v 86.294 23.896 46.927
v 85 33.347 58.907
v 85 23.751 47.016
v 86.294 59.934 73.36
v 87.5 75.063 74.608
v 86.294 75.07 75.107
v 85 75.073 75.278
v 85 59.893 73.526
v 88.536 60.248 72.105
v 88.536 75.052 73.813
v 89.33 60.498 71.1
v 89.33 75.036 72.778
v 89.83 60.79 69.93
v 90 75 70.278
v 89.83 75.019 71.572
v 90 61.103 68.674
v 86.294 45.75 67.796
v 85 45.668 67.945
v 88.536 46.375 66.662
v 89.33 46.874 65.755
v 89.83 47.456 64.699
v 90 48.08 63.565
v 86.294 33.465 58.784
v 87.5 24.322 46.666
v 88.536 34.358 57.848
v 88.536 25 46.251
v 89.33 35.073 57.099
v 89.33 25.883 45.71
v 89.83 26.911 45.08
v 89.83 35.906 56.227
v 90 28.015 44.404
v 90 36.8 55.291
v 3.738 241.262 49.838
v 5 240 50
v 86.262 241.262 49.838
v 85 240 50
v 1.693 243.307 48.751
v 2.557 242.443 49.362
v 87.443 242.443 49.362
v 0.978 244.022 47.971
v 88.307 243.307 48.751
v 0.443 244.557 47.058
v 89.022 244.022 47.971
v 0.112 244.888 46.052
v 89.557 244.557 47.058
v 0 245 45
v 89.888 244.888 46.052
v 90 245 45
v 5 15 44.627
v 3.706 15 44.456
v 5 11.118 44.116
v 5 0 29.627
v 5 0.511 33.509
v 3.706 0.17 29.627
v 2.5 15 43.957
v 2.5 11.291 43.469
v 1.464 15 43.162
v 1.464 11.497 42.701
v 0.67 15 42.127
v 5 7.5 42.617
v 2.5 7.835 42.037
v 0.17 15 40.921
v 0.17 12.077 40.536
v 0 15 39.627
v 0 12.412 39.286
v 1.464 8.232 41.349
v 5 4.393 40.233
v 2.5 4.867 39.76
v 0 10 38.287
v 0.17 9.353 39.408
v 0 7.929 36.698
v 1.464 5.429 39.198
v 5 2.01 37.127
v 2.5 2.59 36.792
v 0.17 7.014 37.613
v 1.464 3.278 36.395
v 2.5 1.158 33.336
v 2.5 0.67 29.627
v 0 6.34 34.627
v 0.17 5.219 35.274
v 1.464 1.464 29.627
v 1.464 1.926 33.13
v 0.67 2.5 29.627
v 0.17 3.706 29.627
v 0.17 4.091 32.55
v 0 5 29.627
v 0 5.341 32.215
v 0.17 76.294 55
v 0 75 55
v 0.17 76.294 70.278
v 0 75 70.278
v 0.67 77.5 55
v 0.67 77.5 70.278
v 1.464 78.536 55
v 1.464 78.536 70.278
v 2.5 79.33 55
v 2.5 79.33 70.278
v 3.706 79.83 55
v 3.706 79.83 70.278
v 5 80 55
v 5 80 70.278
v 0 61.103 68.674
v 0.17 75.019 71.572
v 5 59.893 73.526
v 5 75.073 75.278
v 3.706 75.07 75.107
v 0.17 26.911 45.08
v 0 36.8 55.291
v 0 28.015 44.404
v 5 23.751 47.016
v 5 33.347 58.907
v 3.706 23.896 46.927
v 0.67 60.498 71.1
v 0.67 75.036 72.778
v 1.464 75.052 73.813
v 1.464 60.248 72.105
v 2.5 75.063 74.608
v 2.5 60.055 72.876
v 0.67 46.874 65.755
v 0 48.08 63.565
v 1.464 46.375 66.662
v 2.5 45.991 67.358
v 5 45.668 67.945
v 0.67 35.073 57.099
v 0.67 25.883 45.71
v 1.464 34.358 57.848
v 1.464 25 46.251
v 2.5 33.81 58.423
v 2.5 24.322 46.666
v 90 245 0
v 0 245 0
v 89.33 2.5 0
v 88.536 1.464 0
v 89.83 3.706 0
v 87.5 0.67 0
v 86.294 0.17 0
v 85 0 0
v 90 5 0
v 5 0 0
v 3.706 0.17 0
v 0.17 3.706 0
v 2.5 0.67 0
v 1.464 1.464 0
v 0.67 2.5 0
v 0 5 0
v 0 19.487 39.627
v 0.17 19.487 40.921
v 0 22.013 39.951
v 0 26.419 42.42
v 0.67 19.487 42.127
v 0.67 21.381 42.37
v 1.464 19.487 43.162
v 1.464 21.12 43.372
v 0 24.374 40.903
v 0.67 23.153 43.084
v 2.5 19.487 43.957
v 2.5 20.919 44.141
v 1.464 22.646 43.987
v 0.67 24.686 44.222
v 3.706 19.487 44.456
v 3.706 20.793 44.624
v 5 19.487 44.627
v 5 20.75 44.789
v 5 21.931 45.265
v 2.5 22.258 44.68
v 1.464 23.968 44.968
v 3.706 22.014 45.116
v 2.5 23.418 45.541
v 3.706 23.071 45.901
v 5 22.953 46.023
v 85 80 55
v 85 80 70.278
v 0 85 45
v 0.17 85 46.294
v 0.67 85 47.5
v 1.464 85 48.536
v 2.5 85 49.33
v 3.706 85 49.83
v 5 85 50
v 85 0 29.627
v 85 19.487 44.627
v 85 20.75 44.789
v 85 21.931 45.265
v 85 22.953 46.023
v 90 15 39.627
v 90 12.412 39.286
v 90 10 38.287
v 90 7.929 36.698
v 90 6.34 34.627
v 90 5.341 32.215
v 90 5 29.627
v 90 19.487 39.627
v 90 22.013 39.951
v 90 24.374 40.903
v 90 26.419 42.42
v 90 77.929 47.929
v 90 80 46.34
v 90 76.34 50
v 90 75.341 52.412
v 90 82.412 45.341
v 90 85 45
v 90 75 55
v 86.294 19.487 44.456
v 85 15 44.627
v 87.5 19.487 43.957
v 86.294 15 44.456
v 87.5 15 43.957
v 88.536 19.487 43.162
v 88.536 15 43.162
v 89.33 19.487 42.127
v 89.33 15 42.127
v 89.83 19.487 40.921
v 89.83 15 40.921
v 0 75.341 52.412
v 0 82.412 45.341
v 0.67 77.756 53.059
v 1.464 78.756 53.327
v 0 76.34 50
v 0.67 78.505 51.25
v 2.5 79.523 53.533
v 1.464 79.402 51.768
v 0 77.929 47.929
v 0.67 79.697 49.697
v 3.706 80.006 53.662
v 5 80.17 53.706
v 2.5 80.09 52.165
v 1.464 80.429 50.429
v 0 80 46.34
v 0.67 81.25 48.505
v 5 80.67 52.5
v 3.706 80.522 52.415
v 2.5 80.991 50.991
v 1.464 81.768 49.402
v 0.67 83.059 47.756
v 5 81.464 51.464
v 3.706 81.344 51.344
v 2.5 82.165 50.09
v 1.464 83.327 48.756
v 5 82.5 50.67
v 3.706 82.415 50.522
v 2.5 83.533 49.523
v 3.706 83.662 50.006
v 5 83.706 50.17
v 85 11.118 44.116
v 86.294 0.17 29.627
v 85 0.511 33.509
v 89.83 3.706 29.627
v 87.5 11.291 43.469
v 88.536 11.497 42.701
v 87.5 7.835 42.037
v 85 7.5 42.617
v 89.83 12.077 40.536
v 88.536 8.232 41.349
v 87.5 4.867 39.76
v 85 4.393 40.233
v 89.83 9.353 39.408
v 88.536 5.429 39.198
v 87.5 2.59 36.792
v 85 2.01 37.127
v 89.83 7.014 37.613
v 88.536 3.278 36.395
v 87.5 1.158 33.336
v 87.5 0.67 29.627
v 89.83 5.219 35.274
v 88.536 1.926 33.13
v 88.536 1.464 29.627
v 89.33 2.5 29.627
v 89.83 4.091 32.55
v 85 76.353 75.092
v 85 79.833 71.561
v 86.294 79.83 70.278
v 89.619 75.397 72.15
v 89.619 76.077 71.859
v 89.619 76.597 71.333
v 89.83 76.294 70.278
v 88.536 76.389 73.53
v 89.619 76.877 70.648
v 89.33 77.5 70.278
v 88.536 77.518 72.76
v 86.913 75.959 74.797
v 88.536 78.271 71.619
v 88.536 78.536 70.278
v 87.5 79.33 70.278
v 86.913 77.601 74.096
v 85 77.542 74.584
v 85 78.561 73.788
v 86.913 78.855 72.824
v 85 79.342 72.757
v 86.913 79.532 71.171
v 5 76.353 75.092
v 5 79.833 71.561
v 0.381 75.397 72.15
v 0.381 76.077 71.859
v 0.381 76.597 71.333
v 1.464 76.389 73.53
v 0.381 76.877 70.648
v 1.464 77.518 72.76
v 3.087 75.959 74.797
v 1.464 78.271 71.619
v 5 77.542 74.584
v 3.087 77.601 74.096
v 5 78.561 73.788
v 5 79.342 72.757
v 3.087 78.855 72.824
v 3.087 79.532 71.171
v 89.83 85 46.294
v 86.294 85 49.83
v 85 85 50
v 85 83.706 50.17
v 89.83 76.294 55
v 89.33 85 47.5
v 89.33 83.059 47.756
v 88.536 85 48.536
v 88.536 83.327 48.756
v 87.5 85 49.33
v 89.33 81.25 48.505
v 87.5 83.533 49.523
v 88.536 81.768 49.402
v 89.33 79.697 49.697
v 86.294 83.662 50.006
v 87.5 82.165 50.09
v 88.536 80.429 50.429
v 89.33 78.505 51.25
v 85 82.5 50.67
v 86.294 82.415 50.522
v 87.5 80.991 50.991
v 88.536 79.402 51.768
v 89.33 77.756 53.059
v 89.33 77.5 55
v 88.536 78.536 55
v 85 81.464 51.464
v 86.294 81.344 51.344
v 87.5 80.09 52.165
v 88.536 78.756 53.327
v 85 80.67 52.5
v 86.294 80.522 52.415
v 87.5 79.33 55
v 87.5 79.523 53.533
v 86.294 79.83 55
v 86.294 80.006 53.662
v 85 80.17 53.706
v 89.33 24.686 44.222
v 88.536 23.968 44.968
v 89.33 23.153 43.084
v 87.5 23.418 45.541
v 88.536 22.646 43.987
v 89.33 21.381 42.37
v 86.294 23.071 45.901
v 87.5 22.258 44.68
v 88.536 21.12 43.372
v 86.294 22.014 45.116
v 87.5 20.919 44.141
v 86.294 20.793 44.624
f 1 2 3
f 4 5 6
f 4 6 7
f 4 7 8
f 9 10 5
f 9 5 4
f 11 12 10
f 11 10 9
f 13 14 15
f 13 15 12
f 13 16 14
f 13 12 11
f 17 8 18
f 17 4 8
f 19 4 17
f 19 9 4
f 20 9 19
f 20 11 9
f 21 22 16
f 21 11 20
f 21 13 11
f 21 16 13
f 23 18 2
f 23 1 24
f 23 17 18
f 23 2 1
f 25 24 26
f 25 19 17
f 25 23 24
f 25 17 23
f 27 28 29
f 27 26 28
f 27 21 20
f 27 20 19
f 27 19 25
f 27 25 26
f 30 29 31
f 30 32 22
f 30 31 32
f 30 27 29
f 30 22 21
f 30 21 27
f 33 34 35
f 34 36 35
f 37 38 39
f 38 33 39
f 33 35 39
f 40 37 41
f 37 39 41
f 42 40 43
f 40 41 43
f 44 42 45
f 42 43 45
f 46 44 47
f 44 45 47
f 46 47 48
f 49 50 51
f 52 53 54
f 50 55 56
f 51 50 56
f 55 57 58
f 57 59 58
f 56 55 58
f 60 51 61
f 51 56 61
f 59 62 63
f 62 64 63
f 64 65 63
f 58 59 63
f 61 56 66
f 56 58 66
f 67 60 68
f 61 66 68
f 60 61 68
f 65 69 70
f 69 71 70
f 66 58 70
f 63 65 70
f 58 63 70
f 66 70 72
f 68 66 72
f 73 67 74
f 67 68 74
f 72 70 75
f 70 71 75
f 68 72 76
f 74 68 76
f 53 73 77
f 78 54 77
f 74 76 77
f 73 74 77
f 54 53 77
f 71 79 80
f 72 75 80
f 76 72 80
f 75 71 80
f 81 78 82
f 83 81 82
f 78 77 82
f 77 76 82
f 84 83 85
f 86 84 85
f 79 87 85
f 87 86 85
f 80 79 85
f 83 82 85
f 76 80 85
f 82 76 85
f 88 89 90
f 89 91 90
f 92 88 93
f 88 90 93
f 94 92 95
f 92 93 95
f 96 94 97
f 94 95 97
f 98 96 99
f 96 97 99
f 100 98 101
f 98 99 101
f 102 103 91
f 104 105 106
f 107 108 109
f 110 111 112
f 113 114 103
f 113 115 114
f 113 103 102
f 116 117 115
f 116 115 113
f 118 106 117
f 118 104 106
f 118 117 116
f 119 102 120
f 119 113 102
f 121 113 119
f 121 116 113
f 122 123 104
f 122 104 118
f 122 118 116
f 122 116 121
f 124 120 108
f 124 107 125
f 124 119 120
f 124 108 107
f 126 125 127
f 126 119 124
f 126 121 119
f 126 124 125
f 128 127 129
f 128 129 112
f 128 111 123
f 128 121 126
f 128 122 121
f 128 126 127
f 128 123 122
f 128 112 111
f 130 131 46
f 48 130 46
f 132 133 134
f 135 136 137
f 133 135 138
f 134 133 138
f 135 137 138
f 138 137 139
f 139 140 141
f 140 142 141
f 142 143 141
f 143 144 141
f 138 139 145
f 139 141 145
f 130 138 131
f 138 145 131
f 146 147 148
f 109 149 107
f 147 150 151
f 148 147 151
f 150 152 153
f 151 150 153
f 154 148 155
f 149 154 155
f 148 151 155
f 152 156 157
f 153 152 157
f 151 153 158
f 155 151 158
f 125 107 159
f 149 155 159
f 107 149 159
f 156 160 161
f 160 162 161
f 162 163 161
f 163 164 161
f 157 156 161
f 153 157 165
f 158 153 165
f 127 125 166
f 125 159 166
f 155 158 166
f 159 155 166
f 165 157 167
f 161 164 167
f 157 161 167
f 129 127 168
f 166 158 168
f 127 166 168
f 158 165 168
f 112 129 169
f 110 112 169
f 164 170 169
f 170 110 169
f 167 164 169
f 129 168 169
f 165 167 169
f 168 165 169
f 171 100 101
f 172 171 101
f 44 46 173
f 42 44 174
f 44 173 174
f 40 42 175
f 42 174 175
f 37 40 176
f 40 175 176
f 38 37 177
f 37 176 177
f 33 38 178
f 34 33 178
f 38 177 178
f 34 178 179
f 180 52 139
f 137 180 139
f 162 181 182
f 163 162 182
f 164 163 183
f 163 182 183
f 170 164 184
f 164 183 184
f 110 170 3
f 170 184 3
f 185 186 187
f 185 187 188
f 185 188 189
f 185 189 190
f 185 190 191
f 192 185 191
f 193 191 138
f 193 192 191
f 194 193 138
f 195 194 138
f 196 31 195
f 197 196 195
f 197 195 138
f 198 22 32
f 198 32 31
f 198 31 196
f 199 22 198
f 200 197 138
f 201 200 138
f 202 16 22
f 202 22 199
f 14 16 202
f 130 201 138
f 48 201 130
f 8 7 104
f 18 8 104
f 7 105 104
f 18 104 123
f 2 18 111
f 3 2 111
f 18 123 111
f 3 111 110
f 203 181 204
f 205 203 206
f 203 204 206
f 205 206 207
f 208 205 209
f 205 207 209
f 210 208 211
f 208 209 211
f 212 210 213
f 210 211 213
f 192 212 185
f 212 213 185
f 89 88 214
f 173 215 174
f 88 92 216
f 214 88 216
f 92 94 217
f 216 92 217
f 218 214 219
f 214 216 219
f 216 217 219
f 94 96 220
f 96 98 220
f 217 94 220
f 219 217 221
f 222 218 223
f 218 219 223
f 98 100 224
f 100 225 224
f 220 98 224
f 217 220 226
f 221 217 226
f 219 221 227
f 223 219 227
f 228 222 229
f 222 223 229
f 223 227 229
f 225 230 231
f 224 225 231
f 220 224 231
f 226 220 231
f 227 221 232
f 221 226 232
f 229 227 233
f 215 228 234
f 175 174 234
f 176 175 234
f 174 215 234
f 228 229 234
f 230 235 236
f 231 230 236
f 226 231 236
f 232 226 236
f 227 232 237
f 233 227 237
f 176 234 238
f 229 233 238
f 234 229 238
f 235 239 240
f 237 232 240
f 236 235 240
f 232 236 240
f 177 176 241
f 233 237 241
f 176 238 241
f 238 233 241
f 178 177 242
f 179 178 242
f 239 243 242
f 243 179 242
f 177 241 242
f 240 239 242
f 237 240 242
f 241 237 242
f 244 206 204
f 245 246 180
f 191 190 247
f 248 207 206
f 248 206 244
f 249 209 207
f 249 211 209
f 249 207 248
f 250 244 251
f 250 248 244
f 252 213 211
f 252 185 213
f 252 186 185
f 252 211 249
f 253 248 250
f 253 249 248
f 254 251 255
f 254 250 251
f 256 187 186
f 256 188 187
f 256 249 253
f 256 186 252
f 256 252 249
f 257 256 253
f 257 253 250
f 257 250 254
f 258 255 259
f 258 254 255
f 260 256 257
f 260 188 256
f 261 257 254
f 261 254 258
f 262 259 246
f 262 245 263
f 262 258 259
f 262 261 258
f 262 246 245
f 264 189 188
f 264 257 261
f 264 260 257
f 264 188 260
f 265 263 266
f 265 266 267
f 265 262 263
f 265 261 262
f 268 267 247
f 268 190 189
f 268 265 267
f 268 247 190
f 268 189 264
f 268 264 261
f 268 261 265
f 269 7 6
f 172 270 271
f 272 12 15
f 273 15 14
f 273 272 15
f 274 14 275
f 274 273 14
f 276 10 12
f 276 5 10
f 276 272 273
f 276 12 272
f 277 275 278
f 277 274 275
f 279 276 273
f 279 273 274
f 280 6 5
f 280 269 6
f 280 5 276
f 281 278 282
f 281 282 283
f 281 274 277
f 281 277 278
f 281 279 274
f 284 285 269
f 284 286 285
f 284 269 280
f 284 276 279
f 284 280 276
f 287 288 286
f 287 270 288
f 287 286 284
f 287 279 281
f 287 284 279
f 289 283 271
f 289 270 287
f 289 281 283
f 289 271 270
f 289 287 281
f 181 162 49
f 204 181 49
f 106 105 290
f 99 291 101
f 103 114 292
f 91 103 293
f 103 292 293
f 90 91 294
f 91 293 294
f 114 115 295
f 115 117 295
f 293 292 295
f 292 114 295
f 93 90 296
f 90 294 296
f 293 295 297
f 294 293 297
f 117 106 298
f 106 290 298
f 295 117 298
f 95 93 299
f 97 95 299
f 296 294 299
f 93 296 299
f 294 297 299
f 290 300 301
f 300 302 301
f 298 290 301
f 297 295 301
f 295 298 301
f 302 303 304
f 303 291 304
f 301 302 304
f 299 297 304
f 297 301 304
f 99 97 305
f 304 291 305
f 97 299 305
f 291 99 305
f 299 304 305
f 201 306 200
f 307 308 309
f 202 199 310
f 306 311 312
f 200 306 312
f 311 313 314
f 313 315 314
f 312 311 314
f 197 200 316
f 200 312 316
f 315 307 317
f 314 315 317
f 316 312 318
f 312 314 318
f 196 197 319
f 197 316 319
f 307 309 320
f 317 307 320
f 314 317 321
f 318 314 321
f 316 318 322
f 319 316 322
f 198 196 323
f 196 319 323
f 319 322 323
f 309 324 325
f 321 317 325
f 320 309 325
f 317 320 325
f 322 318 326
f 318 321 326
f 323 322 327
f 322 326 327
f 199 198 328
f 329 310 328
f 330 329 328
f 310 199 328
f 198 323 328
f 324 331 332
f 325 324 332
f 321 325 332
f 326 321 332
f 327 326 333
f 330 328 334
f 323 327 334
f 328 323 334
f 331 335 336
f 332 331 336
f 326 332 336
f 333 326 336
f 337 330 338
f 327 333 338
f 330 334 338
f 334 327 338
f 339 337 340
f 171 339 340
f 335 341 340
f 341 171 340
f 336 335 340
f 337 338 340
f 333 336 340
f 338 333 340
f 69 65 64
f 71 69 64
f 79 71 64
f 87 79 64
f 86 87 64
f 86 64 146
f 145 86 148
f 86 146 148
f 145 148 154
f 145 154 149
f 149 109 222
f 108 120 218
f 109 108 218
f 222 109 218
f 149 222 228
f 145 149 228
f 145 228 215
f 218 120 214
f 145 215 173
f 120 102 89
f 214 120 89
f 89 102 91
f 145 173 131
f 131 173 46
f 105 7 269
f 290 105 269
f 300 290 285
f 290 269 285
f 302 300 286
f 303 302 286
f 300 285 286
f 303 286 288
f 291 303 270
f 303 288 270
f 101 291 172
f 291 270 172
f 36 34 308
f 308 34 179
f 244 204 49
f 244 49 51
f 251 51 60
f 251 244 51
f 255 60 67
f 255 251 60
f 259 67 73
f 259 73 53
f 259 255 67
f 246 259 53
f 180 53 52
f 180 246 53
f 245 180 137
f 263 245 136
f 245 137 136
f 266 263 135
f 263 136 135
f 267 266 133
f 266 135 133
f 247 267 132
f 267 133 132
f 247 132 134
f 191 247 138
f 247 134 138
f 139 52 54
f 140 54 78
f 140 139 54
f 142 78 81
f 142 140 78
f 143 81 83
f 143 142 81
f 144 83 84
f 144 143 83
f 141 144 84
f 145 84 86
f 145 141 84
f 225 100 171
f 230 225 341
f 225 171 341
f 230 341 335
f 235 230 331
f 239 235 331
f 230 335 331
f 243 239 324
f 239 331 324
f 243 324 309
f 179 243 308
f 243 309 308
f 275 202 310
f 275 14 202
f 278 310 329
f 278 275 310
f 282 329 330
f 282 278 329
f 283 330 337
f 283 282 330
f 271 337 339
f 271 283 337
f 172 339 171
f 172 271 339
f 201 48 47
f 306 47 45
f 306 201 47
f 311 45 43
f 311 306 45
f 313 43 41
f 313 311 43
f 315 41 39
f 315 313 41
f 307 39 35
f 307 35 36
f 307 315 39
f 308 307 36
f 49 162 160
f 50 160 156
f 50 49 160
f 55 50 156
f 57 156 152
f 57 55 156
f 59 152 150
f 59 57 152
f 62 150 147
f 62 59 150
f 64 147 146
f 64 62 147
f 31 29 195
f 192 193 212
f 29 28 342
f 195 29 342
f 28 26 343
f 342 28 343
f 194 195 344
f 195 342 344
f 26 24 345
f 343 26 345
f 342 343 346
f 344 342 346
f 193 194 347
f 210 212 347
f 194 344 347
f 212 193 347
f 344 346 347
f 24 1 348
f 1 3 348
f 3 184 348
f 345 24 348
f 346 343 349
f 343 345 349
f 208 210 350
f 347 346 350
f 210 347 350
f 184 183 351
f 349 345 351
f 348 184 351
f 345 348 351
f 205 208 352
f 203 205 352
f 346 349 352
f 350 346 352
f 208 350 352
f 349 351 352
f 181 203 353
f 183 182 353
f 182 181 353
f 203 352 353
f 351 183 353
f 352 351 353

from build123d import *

# Parameters (mm, degrees)
F1_DEPTH = 90
F2_R     = 15
F3_R     = 5


with BuildPart() as f1:
    # F0 (on Right) → F1 (new body)
    with BuildSketch(Plane.YZ):
        with BuildLine():
            Line((0, 15), (0, 0))
            Line((0, 0), (245, 0))
            Line((245, 0), (245, 50))
            Line((245, 50), (80, 50))
            Line((80, 50), (80, 75))
            ThreePointArc((80, 75), (46.6250520012, 68.4603820444), (22.3636995256, 44.6267811209))
            Line((22.3636995256, 44.6267811209), (0, 44.6267811209))
            Line((0, 44.6267811209), (0, 15))
        make_face()
    extrude(amount=F1_DEPTH)

    # F2
    f2_edges = [f1.edges().sort_by_distance(p)[0] for p in [
        (45, 0, 44.626781),
    ]]
    fillet(f2_edges, radius=F2_R)

    # F3
    f3_edges = [f1.edges().sort_by_distance(p)[0] for p in [
        (90, 46.625052, 68.460382),
        (90, 162.5, 50),
        (90, 18.68185, 44.626781),
        (45, 22.3637, 44.626781),
        (0, 18.68185, 44.626781),
        (0, 80, 62.5),
        (0, 162.5, 50),
        (45, 245, 50),
        (90, 80, 62.5),
        (45, 80, 75),
        (45, 80, 50),
        (0, 4.393398, 40.233383),
        (0, 46.625052, 68.460382),
        (0, 0, 14.813391),
        (90, 4.393398, 40.233383),
        (90, 0, 14.813391),
    ]]
    fillet(f3_edges, radius=F3_R)


solid = f1.part
